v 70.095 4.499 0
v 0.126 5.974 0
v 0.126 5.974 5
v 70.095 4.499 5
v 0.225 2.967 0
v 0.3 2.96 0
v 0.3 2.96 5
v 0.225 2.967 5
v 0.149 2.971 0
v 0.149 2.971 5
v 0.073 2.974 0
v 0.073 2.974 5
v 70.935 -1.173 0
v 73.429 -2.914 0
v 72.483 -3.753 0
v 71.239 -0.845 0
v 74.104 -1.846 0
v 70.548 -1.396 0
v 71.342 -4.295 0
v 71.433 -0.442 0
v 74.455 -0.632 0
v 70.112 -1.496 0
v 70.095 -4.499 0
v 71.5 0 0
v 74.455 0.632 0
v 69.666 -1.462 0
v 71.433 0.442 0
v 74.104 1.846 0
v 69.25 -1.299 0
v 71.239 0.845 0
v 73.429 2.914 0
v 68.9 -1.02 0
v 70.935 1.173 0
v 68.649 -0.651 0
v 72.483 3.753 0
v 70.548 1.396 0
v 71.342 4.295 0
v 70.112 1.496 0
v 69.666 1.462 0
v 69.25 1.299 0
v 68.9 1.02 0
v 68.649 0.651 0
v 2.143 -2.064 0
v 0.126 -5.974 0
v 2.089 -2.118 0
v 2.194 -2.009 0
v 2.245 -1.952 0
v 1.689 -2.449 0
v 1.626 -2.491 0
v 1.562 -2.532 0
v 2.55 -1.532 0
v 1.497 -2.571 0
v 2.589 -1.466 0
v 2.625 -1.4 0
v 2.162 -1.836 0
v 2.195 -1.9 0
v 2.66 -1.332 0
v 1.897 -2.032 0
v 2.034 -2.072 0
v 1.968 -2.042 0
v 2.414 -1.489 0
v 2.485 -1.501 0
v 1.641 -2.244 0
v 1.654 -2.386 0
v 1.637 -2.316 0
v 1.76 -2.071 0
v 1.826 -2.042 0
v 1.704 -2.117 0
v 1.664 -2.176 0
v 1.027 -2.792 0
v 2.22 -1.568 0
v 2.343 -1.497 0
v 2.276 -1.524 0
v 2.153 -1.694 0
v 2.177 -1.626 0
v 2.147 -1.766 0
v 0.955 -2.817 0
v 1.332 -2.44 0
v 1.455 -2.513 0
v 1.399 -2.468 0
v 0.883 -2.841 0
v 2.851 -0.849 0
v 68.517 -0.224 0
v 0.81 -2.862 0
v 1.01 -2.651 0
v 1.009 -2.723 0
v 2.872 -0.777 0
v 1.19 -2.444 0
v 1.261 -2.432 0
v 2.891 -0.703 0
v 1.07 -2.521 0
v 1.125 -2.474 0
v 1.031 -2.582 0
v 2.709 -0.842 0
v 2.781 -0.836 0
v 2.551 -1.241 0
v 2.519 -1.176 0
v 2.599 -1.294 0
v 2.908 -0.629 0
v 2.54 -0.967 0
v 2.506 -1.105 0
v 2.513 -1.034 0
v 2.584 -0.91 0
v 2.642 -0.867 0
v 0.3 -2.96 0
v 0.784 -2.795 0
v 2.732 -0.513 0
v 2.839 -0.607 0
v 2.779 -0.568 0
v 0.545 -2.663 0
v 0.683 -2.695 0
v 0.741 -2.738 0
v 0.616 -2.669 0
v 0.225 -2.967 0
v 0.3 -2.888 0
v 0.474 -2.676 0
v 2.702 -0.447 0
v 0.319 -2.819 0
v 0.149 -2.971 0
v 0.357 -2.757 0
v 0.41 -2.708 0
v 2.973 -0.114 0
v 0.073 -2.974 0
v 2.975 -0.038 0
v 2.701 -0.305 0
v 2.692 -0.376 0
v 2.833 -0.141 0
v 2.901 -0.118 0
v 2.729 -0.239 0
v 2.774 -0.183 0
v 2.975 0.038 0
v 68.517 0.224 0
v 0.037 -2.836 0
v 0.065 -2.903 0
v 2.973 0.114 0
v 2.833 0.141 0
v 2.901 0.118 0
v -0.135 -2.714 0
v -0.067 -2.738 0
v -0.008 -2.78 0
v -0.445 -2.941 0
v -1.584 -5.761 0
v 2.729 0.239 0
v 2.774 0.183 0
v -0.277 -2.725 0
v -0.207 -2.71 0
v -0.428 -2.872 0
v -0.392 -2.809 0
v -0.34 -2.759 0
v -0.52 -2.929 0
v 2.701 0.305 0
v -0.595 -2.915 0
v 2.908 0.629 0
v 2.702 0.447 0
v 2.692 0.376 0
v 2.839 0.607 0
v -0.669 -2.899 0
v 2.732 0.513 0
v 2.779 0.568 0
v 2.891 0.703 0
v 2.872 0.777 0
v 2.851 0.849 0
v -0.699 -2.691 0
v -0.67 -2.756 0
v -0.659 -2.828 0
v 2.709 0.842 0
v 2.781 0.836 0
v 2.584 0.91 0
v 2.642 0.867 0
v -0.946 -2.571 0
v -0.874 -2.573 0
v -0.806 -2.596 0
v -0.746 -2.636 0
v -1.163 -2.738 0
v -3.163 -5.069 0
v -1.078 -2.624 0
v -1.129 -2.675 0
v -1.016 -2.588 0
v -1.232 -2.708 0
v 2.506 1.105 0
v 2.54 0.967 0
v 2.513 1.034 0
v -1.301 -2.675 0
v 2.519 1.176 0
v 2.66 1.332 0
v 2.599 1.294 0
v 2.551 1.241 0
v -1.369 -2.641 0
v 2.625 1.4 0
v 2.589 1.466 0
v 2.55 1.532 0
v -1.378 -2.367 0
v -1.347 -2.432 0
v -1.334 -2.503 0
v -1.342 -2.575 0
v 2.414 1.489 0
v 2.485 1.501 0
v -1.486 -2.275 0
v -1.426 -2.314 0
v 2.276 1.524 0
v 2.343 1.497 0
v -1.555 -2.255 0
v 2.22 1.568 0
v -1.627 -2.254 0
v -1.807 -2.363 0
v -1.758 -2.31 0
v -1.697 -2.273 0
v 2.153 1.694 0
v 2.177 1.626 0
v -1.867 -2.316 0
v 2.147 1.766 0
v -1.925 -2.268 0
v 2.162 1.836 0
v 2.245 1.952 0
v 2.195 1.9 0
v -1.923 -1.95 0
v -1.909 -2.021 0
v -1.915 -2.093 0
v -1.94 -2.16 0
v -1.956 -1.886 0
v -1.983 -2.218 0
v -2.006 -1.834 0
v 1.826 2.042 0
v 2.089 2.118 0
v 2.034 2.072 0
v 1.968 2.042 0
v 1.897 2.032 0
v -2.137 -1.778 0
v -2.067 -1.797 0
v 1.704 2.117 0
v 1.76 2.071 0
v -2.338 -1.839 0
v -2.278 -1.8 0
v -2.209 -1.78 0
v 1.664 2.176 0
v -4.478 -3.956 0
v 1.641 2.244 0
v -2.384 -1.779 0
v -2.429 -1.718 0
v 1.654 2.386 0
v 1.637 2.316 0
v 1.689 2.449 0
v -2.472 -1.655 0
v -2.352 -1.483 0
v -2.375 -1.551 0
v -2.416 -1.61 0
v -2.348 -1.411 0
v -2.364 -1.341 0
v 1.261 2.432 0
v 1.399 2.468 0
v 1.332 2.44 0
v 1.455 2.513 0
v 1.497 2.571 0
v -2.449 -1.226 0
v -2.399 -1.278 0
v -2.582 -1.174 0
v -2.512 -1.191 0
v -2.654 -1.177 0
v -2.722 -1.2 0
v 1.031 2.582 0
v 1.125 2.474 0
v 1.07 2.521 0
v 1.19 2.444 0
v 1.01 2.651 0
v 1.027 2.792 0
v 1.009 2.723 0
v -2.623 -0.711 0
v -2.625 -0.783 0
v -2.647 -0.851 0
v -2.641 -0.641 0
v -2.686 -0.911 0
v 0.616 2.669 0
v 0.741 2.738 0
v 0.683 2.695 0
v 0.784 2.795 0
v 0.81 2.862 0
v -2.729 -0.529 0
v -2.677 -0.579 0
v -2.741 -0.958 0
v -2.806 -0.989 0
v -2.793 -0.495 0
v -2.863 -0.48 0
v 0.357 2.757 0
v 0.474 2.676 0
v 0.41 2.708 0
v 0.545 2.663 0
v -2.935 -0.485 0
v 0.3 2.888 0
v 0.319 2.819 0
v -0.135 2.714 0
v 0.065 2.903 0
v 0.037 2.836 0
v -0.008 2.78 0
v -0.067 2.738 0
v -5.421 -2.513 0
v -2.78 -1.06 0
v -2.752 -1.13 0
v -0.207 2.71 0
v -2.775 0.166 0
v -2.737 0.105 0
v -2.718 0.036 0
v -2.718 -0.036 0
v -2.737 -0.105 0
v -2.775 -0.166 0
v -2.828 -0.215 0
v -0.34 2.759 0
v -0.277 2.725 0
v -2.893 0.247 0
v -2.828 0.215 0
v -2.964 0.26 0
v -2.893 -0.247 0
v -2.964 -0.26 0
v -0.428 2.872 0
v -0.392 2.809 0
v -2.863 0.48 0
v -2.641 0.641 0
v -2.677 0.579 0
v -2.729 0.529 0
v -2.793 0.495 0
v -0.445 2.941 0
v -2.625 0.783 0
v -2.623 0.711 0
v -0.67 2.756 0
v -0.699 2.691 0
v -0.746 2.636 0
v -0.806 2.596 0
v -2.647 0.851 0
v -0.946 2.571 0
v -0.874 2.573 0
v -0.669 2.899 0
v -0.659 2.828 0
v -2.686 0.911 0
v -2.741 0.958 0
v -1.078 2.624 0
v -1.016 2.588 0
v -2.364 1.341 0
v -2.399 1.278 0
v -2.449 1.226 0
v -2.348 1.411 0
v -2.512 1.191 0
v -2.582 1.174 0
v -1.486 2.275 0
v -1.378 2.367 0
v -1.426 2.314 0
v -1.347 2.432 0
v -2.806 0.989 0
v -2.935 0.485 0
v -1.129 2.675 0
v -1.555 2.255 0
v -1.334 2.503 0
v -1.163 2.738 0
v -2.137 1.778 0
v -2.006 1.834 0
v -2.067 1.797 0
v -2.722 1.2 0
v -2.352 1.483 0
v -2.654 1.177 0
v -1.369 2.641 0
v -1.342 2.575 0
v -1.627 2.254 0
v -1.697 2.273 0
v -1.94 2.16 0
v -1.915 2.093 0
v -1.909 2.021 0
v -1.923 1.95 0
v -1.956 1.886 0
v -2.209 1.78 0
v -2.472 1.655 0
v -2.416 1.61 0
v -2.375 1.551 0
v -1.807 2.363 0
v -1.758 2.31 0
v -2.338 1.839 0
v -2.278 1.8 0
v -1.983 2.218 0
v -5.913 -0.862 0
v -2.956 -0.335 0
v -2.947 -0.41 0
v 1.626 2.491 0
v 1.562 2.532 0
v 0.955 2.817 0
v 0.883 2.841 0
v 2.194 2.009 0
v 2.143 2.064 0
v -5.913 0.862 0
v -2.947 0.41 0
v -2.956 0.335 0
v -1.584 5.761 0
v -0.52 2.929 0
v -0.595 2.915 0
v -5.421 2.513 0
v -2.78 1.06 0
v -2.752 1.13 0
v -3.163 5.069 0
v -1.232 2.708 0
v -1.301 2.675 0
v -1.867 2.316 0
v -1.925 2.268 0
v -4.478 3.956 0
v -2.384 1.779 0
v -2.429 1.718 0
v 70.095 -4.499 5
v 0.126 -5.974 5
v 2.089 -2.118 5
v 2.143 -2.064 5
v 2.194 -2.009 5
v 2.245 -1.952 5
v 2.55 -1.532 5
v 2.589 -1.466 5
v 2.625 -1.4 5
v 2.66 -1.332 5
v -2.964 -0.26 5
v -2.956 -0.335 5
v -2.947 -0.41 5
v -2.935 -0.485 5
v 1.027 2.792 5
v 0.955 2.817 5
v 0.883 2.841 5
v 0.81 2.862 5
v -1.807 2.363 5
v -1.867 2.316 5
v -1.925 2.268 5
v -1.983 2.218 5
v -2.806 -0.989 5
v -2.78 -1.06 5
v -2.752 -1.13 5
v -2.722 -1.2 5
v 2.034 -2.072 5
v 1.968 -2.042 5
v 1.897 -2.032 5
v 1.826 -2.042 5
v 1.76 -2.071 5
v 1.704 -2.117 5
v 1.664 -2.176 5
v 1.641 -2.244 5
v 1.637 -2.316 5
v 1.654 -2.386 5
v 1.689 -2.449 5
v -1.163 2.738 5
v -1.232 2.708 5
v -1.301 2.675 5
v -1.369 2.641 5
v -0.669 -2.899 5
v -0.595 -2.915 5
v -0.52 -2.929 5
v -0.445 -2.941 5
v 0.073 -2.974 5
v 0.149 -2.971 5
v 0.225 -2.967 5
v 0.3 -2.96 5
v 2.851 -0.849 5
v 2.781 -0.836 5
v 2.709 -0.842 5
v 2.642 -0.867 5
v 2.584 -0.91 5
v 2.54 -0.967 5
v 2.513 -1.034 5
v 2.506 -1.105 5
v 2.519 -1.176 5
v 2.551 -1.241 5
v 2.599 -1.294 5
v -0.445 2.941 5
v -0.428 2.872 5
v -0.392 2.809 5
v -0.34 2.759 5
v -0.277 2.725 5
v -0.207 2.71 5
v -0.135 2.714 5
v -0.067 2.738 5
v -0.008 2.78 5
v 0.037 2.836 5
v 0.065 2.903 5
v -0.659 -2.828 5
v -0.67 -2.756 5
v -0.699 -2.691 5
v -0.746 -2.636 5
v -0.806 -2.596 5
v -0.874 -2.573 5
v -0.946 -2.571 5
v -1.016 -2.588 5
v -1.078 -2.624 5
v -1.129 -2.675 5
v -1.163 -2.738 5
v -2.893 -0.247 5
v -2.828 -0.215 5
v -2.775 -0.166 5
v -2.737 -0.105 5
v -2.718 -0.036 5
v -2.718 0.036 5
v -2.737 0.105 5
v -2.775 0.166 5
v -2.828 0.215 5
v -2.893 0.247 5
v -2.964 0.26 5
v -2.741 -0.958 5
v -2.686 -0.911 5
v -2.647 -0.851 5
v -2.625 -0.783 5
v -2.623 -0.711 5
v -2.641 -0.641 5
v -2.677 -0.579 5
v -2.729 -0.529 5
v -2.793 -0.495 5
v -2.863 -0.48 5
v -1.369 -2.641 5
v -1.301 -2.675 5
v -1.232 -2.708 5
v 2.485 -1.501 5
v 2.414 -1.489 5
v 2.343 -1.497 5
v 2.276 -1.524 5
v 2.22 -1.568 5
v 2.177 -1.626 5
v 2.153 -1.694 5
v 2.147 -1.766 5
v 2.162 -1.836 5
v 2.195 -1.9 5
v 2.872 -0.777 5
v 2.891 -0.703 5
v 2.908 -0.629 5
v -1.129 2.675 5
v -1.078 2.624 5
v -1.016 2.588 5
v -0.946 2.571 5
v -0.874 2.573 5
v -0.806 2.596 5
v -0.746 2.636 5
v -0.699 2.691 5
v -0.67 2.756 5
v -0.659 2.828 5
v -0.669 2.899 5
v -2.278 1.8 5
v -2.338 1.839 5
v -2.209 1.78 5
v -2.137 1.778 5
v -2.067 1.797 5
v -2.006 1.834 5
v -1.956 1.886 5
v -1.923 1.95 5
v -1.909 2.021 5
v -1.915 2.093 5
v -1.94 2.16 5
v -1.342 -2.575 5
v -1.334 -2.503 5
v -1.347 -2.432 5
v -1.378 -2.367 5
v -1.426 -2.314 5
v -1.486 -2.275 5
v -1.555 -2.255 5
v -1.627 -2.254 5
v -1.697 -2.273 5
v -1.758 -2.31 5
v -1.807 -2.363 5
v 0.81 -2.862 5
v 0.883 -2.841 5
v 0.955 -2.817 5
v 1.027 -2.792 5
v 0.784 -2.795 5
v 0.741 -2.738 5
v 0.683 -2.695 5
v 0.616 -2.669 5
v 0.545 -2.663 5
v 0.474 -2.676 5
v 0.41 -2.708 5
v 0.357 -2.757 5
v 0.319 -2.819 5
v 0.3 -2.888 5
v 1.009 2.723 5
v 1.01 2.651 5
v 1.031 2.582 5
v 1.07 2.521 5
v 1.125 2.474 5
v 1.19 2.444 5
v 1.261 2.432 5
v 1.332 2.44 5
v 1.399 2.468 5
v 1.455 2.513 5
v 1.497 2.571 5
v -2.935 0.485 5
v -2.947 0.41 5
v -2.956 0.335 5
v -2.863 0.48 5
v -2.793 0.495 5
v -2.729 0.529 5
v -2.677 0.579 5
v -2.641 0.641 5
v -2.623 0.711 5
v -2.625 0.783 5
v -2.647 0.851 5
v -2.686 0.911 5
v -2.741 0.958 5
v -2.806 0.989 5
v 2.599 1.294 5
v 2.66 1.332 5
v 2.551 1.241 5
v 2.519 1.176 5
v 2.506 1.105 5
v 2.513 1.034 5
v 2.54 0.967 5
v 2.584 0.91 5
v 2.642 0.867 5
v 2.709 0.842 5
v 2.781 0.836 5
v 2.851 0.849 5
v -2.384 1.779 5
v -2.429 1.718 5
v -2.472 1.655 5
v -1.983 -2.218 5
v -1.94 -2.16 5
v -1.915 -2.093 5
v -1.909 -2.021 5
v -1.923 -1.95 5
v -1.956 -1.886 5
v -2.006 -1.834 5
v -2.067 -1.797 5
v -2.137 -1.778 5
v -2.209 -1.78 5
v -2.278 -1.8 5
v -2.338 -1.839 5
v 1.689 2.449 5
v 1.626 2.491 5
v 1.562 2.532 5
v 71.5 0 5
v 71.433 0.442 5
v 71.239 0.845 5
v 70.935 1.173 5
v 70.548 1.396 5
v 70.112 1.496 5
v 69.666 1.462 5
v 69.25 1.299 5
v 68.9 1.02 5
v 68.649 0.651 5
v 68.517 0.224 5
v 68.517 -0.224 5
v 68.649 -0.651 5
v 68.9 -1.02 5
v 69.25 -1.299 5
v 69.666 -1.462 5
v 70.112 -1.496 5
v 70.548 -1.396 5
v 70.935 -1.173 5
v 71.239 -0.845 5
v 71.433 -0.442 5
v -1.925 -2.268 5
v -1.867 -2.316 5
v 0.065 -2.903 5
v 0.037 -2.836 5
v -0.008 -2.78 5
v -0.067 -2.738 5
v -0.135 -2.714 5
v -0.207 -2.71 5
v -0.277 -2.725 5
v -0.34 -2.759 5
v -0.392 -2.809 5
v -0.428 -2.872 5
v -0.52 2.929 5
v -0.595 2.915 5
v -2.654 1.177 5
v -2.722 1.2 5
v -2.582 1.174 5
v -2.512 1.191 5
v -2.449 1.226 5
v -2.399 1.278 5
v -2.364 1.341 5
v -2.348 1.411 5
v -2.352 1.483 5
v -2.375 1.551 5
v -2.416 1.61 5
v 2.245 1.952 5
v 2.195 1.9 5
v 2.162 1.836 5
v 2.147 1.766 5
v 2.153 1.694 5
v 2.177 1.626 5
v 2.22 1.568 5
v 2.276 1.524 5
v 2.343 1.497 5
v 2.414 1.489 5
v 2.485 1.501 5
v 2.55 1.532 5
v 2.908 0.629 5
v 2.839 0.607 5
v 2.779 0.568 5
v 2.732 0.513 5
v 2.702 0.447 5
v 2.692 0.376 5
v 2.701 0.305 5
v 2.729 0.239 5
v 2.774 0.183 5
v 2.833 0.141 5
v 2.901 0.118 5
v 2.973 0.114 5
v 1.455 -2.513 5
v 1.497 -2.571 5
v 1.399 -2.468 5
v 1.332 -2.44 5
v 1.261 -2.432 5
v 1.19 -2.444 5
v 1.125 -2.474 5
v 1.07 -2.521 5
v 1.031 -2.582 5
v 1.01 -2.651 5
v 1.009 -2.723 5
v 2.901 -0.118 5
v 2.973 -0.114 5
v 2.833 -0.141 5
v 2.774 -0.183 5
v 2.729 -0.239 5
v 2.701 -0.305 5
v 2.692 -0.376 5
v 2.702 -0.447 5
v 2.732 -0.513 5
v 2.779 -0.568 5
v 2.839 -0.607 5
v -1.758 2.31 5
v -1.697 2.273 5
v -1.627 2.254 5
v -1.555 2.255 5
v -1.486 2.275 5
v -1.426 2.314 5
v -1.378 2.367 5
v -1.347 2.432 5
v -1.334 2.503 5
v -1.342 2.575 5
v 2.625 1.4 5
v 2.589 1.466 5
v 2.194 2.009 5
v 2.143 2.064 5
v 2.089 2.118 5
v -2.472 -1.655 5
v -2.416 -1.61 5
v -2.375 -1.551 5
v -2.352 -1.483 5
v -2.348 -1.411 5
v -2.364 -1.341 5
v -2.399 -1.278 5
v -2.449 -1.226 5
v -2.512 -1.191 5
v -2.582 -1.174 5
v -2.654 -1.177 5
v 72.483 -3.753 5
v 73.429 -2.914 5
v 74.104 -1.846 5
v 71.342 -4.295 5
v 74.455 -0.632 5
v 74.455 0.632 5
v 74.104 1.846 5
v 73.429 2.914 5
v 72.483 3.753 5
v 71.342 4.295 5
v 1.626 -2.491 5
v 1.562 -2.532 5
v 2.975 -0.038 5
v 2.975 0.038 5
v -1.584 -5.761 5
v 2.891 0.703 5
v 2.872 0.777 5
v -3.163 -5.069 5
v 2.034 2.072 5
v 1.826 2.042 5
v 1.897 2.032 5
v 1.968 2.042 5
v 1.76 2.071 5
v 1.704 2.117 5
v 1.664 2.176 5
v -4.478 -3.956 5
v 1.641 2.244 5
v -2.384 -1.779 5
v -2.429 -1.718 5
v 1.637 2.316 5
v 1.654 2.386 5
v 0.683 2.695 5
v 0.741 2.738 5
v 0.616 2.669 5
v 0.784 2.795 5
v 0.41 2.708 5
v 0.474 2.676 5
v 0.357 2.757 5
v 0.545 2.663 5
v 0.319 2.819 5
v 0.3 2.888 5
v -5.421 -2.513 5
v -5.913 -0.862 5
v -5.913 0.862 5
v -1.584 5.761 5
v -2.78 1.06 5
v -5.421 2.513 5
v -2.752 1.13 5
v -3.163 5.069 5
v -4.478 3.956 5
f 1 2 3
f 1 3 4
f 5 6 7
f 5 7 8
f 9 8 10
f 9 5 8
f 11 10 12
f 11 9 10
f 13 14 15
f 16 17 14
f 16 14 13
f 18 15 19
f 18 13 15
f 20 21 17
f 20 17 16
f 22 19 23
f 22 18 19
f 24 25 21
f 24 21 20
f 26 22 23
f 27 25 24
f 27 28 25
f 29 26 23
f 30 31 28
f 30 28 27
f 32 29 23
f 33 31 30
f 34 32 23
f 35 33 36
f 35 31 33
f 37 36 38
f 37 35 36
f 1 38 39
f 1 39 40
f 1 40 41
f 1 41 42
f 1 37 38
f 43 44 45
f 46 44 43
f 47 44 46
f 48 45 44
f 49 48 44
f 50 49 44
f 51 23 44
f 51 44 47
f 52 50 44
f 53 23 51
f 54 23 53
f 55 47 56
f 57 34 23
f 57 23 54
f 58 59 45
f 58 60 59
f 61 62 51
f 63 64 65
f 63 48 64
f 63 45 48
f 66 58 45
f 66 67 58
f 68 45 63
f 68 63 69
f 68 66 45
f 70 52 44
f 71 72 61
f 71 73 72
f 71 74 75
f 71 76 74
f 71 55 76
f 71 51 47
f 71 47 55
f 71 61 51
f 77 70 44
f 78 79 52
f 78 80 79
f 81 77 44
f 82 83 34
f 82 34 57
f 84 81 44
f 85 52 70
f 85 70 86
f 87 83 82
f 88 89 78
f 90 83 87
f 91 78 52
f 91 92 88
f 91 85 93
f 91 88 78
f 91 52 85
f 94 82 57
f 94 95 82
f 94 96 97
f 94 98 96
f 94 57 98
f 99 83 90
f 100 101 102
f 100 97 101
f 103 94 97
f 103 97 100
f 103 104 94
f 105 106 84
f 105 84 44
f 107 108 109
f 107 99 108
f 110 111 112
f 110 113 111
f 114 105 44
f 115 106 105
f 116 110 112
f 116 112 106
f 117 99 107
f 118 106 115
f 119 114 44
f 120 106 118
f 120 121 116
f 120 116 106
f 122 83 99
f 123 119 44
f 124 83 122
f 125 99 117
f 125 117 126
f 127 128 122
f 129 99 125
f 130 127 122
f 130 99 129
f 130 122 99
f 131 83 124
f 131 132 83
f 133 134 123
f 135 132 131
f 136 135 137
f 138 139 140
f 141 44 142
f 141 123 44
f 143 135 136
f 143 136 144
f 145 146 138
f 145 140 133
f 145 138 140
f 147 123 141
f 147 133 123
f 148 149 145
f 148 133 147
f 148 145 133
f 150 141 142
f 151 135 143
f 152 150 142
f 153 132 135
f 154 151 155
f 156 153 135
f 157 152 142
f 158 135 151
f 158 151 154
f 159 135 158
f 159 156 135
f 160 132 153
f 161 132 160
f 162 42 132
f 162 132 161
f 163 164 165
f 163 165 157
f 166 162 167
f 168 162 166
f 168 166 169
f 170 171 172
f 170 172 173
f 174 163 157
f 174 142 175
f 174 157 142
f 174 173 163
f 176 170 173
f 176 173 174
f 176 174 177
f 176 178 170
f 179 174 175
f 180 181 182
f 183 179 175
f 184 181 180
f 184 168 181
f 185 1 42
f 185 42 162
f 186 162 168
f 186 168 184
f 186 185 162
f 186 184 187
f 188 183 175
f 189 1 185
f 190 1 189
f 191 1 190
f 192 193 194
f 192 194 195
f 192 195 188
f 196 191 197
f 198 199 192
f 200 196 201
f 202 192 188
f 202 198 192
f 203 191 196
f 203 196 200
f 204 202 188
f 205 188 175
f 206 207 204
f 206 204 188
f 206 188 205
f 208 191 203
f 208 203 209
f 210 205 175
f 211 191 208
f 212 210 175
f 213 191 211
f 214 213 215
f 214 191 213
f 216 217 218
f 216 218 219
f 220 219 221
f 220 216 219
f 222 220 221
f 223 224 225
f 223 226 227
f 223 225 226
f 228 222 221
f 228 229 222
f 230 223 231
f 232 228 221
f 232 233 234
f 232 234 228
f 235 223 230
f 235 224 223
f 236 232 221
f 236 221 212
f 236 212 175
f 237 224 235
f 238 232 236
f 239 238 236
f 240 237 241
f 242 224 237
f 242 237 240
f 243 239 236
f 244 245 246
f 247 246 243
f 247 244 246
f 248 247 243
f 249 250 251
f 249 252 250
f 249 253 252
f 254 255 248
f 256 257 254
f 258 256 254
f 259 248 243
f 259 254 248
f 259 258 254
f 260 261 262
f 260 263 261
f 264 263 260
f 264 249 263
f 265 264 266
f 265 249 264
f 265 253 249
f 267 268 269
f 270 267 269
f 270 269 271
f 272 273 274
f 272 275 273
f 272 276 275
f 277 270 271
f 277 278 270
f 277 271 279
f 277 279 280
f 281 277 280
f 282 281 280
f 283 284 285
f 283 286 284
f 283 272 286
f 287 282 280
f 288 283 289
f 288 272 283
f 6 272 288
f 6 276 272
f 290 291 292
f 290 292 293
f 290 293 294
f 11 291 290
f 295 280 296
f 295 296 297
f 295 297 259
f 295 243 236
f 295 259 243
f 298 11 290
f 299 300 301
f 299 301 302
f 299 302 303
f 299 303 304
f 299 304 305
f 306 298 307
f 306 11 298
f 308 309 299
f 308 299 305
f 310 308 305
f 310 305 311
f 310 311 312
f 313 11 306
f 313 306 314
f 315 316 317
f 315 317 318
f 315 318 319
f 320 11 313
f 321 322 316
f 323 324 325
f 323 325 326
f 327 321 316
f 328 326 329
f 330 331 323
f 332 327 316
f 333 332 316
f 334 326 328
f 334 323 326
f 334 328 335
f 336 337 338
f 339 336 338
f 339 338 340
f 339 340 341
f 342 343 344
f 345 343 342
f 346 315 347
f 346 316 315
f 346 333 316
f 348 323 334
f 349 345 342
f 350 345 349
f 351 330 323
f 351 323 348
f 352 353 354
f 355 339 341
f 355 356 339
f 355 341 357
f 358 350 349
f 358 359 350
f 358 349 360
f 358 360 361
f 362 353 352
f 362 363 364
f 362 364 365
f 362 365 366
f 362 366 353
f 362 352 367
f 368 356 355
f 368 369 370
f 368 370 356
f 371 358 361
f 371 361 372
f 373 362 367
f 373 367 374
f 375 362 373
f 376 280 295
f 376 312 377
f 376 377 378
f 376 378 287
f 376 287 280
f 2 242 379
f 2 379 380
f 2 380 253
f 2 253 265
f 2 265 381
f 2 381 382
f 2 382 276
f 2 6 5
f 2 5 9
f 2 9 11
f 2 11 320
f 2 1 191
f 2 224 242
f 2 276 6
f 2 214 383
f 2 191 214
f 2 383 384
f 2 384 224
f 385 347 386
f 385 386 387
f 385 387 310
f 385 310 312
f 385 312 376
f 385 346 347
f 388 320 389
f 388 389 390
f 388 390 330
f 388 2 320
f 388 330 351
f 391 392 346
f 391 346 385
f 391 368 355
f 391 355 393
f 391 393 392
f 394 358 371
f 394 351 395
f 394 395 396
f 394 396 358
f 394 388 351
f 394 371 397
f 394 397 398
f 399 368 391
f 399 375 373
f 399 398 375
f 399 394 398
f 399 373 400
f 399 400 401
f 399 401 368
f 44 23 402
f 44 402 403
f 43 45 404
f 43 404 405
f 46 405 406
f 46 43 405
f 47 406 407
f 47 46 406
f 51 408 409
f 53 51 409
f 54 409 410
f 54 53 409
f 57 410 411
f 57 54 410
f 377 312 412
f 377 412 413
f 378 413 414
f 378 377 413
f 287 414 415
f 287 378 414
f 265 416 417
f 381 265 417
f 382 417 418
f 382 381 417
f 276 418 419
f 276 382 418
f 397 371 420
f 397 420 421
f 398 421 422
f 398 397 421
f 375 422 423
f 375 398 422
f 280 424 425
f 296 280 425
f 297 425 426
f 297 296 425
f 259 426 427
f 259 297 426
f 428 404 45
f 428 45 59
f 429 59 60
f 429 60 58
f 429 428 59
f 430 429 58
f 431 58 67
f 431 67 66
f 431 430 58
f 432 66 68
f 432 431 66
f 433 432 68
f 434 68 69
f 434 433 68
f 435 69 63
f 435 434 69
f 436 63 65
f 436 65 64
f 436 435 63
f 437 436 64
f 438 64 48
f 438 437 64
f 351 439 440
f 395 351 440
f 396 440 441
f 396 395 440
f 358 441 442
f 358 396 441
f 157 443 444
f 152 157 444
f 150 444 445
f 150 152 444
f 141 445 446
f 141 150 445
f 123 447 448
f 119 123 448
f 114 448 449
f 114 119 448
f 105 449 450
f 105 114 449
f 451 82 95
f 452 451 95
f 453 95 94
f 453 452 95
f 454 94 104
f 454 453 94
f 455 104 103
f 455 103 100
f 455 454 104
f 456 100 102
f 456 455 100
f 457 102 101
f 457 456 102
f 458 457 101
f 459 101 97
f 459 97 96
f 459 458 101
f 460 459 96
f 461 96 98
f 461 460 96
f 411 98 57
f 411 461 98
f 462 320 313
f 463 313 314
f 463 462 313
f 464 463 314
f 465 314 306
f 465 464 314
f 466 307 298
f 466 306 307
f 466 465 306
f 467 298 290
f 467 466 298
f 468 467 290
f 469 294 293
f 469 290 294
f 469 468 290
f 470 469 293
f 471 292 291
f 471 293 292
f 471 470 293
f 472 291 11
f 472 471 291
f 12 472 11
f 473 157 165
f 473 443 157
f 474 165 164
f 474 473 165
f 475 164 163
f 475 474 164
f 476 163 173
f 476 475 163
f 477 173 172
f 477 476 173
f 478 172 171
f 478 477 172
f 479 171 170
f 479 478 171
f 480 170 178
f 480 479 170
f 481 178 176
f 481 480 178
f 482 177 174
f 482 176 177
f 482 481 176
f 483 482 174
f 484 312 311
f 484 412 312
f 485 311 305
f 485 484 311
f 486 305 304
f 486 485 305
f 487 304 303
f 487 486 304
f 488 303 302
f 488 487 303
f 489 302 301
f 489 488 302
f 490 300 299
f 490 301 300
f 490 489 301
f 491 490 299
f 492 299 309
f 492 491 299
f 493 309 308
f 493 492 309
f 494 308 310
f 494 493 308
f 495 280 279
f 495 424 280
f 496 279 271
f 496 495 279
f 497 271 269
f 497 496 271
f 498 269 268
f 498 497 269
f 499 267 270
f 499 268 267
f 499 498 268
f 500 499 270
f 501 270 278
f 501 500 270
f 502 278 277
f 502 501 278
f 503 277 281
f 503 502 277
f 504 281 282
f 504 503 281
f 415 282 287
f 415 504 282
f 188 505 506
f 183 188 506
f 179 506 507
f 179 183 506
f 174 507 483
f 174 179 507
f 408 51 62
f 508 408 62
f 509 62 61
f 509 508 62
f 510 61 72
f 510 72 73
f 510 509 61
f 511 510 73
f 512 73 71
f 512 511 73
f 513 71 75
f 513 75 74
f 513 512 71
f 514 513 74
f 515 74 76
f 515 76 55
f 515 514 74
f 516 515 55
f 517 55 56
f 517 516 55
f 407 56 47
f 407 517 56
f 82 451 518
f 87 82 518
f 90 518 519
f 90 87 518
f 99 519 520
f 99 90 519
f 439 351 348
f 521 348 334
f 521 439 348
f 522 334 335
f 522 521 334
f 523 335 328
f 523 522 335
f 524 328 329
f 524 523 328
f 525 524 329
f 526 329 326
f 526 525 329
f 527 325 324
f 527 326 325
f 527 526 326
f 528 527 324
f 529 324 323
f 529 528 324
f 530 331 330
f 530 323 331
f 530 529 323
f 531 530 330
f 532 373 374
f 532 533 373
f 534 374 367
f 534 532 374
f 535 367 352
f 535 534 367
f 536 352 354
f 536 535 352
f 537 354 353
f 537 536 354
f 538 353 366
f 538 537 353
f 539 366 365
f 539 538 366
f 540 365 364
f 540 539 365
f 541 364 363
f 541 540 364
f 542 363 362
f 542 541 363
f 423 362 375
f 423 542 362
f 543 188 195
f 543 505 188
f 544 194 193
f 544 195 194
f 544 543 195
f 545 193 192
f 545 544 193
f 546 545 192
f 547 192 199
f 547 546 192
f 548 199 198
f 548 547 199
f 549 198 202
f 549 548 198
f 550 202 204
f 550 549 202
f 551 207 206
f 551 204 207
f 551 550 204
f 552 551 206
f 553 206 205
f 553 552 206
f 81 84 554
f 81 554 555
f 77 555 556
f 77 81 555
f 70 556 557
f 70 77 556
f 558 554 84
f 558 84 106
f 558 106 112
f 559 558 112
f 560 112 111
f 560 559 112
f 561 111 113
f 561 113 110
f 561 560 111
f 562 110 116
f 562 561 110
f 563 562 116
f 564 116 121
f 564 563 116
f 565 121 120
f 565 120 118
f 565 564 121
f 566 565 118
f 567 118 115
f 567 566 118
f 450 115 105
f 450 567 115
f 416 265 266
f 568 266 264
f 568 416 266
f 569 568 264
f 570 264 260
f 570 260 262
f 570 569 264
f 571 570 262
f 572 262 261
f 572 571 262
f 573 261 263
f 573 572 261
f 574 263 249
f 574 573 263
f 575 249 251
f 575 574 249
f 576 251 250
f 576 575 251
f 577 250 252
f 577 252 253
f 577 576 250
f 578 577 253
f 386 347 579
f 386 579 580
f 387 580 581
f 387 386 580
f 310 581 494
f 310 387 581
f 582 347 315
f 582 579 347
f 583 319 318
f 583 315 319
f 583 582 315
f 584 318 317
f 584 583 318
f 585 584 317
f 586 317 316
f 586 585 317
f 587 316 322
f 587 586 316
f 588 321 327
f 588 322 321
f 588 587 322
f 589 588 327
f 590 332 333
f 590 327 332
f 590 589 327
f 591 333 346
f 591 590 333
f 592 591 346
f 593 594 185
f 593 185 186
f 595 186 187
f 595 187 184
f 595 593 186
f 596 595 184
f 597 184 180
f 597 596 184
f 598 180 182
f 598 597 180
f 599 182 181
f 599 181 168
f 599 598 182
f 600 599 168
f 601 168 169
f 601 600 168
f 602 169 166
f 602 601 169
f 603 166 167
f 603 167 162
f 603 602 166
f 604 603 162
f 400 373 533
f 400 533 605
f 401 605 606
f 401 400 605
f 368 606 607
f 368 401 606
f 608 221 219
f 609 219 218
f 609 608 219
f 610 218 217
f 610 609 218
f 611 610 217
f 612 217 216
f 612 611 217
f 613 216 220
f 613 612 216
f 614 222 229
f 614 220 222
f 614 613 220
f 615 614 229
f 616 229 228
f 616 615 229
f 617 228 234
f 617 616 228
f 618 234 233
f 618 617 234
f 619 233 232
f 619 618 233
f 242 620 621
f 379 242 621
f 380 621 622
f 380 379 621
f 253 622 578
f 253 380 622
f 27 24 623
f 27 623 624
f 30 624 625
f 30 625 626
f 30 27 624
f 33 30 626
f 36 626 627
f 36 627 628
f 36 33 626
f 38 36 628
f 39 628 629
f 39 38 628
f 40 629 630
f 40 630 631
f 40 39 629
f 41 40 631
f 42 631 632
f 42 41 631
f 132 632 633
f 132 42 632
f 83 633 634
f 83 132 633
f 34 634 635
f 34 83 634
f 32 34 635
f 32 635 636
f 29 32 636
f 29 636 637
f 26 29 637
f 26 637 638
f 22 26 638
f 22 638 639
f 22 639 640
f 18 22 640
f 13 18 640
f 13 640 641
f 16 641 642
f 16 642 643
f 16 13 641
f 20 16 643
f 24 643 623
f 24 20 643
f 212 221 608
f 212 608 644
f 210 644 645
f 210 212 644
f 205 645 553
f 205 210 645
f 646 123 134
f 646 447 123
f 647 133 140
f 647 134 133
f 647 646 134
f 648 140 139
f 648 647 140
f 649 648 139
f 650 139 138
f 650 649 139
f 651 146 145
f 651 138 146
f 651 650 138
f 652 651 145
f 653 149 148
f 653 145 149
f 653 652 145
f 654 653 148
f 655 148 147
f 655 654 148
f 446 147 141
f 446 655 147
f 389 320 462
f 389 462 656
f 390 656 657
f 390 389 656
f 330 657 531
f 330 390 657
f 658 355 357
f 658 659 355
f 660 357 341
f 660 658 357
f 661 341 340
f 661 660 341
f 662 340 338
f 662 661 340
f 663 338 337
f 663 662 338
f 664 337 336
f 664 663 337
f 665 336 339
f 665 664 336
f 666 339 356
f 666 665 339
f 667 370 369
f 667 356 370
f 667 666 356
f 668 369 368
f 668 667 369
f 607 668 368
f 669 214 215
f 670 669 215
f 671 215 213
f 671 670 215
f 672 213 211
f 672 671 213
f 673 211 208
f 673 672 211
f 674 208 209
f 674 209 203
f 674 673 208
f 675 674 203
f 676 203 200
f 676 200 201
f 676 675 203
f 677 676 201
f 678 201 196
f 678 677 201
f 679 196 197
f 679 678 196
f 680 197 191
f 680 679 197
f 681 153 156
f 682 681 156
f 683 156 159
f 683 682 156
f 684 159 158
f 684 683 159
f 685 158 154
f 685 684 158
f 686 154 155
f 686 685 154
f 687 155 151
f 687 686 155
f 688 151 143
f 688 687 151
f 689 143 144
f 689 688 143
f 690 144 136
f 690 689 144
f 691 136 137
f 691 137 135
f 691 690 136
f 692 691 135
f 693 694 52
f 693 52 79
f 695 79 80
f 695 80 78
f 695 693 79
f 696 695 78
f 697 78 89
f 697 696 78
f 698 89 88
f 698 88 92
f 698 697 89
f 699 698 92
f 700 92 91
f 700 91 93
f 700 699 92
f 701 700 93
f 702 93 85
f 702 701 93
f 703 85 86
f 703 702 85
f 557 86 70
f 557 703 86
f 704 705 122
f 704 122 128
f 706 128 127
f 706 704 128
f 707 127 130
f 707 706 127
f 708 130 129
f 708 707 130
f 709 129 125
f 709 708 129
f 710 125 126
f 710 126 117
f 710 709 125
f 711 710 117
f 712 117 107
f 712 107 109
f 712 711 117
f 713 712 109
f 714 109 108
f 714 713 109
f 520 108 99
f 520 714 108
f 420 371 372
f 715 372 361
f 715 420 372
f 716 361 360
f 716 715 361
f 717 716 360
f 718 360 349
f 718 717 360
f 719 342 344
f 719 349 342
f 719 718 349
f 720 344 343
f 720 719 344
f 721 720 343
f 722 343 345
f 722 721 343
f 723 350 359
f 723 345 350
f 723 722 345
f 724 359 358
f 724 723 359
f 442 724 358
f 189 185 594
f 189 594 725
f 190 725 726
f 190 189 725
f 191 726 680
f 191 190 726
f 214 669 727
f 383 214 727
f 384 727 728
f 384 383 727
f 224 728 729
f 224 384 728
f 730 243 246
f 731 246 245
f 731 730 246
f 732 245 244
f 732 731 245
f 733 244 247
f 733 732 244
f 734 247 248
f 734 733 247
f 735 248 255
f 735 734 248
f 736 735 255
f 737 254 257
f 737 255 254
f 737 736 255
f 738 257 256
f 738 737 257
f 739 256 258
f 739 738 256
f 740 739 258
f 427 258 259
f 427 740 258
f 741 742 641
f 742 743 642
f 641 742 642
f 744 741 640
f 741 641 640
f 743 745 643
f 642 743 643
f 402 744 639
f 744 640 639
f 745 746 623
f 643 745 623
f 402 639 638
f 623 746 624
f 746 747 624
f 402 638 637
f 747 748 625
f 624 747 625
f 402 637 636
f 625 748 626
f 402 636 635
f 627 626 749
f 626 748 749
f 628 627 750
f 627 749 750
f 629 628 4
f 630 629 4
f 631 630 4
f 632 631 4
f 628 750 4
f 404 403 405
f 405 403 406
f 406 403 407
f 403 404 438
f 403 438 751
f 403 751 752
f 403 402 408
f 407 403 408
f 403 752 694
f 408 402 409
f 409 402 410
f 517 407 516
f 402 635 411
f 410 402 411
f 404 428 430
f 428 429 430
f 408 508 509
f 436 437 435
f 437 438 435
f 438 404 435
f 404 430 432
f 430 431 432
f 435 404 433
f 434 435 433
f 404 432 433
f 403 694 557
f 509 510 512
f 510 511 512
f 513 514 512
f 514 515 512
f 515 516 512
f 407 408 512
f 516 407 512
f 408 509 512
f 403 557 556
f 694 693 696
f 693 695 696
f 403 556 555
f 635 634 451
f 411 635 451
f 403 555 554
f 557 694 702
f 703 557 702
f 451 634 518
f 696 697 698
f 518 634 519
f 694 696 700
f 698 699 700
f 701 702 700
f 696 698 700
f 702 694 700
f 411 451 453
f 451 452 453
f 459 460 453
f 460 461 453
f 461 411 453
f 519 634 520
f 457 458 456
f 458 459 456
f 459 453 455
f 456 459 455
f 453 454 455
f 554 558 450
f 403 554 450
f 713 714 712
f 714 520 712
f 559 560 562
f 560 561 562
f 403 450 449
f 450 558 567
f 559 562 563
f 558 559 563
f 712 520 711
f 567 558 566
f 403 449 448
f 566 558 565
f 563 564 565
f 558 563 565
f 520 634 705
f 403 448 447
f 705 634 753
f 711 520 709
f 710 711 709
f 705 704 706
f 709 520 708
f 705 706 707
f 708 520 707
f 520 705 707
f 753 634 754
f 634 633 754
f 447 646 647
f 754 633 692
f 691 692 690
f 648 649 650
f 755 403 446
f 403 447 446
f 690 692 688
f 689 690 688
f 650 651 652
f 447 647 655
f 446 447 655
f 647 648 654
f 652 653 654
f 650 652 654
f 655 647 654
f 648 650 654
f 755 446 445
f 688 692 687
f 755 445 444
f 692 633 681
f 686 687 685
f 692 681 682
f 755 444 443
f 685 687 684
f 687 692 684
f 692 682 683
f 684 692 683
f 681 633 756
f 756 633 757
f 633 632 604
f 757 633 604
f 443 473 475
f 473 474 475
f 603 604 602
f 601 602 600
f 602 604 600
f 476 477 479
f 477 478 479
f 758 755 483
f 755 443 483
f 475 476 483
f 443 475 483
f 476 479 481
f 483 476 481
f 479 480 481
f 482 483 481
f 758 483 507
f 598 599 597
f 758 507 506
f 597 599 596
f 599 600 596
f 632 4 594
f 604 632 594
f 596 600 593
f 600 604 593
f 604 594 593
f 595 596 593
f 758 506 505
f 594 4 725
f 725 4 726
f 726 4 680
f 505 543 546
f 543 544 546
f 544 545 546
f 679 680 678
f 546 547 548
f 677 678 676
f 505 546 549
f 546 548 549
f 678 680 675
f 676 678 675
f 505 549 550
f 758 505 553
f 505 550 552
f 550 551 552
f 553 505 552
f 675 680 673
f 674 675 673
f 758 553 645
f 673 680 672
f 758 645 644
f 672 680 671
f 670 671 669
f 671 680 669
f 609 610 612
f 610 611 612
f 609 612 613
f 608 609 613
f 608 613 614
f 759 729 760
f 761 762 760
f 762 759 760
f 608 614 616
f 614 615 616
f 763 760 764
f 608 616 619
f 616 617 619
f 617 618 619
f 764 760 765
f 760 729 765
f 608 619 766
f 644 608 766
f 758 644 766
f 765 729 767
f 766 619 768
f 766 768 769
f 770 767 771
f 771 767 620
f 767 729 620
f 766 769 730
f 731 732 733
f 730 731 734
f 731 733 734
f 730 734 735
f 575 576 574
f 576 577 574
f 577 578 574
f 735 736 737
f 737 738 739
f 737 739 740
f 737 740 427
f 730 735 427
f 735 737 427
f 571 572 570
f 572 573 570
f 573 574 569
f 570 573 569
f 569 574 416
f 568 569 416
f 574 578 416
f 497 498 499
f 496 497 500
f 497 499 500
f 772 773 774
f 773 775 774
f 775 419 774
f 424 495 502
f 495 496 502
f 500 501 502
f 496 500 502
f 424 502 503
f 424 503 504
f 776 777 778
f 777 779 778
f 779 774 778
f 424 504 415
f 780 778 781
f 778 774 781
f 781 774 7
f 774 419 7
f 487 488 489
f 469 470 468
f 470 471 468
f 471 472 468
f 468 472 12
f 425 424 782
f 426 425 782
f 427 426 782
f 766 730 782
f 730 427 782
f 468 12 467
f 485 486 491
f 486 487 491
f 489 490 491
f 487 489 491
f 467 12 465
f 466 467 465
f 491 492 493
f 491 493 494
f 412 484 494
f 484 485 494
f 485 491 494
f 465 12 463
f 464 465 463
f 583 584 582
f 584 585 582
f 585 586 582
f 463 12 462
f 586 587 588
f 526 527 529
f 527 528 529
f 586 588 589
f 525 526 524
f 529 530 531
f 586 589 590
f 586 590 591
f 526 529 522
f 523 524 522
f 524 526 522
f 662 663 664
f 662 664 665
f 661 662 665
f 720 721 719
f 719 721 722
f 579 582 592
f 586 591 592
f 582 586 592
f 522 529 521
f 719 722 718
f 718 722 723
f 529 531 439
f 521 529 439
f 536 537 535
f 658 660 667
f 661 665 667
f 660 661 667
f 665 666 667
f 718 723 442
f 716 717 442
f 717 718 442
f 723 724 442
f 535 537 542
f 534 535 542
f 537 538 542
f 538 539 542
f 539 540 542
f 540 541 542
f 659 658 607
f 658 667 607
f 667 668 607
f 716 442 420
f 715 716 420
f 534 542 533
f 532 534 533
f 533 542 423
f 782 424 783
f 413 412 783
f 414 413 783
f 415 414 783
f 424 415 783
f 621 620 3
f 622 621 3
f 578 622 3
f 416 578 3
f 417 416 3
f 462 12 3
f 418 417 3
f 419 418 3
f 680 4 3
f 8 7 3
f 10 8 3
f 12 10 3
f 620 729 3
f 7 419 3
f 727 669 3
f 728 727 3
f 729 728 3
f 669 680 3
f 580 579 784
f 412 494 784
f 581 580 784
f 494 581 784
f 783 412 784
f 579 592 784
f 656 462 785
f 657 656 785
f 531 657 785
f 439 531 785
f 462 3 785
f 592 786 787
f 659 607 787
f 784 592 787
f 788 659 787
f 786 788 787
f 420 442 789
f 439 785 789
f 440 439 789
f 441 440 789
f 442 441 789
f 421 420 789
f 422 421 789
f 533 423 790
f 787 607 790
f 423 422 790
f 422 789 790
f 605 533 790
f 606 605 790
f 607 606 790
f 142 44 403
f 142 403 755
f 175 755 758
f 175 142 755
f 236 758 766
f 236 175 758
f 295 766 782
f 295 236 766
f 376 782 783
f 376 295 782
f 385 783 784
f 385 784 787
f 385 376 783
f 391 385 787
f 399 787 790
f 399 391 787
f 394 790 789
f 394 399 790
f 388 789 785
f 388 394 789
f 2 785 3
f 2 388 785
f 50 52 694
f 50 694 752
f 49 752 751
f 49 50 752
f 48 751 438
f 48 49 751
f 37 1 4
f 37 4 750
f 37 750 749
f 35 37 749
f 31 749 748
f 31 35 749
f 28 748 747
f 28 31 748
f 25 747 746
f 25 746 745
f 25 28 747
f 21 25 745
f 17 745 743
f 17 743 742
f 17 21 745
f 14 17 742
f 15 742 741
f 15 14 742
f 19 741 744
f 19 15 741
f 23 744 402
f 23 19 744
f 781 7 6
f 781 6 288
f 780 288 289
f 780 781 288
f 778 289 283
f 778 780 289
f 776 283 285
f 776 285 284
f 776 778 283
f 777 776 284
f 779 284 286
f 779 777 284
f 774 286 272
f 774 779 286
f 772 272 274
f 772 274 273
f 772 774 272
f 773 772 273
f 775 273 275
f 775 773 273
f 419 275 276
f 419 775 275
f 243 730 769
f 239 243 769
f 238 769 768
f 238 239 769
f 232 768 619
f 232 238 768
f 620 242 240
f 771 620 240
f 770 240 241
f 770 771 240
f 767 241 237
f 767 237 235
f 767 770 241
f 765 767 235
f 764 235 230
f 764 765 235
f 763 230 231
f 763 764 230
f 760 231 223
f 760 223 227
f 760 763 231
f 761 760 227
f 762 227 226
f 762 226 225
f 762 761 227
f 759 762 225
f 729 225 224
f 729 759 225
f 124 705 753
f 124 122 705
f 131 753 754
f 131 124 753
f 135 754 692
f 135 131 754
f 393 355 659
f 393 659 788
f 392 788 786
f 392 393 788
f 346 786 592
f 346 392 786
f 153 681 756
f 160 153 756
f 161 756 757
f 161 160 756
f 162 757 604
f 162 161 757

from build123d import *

# Parameters (mm, degrees)
ESQUISSE1_R        = 2.975
ESQUISSE1_R_2      = 1.5
BOSS_EXTRU_1_DEPTH = 5
ESQUISSE2_R        = 0.26
BOSS_EXTRU_2_DEPTH = 5


with BuildPart() as part:
    # Esquisse1 → Boss.-Extru.1 (new body)
    with BuildSketch(Plane.XY):
        with BuildLine():
            Line((0.125901786, 5.973673387), (70.094821429, 4.499000878))
            ThreePointArc((70.094821429, 4.499000878), (74.5, 0), (70.094821429, -4.499000878))
            Line((70.094821429, -4.499000878), (0.125901786, -5.973673387))
            ThreePointArc((0.125901786, -5.973673387), (-5.975, 0), (0.125901786, 5.973673387))
        make_face()
        Circle(ESQUISSE1_R, mode=Mode.SUBTRACT)
        with Locations((70, 0)):
            Circle(ESQUISSE1_R_2, mode=Mode.SUBTRACT)
    extrude(amount=BOSS_EXTRU_1_DEPTH)

    # Esquisse2 → Boss.-Extru.2 (add)
    with BuildSketch(Plane.XY.offset(5)):
        with Locations((2.951541236, 0.37286637)):
            Circle(ESQUISSE2_R)
        with Locations((2.951541236, -0.37286637)):
            Circle(ESQUISSE2_R)
        with Locations((2.766085046, -1.095170544)):
            Circle(ESQUISSE2_R)
        with Locations((2.406825558, -1.748661126)):
            Circle(ESQUISSE2_R)
        with Locations((1.89633637, -2.292276897)):
            Circle(ESQUISSE2_R)
        with Locations((1.266693392, -2.691860481)):
            Circle(ESQUISSE2_R)
        with Locations((0.557459411, -2.922304571)):
            Circle(ESQUISSE2_R)
        with Locations((-0.186801796, -2.969129517)):
            Circle(ESQUISSE2_R)
        with Locations((-0.919325558, -2.829393136)):
            Circle(ESQUISSE2_R)
        with Locations((-1.594084715, -2.511875578)):
            Circle(ESQUISSE2_R)
        with Locations((-2.168681667, -2.03652764)):
            Circle(ESQUISSE2_R)
        with Locations((-2.607012373, -1.43321718)):
            Circle(ESQUISSE2_R)
        with Locations((-2.881534904, -0.739852414)):
            Circle(ESQUISSE2_R)
        with Locations((-2.975, 0)):
            Circle(ESQUISSE2_R)
        with Locations((-2.881534904, 0.739852414)):
            Circle(ESQUISSE2_R)
        with Locations((-2.607012373, 1.43321718)):
            Circle(ESQUISSE2_R)
        with Locations((-2.168681667, 2.03652764)):
            Circle(ESQUISSE2_R)
        with Locations((-1.594084715, 2.511875578)):
            Circle(ESQUISSE2_R)
        with Locations((-0.919325558, 2.829393136)):
            Circle(ESQUISSE2_R)
        with Locations((-0.186801796, 2.969129517)):
            Circle(ESQUISSE2_R)
        with Locations((0.557459411, 2.922304571)):
            Circle(ESQUISSE2_R)
        with Locations((1.266693392, 2.691860481)):
            Circle(ESQUISSE2_R)
        with Locations((1.89633637, 2.292276897)):
            Circle(ESQUISSE2_R)
        with Locations((2.406825558, 1.748661126)):
            Circle(ESQUISSE2_R)
        with Locations((2.766085046, 1.095170544)):
            Circle(ESQUISSE2_R)
    extrude(amount=-BOSS_EXTRU_2_DEPTH)


solid = part.part
